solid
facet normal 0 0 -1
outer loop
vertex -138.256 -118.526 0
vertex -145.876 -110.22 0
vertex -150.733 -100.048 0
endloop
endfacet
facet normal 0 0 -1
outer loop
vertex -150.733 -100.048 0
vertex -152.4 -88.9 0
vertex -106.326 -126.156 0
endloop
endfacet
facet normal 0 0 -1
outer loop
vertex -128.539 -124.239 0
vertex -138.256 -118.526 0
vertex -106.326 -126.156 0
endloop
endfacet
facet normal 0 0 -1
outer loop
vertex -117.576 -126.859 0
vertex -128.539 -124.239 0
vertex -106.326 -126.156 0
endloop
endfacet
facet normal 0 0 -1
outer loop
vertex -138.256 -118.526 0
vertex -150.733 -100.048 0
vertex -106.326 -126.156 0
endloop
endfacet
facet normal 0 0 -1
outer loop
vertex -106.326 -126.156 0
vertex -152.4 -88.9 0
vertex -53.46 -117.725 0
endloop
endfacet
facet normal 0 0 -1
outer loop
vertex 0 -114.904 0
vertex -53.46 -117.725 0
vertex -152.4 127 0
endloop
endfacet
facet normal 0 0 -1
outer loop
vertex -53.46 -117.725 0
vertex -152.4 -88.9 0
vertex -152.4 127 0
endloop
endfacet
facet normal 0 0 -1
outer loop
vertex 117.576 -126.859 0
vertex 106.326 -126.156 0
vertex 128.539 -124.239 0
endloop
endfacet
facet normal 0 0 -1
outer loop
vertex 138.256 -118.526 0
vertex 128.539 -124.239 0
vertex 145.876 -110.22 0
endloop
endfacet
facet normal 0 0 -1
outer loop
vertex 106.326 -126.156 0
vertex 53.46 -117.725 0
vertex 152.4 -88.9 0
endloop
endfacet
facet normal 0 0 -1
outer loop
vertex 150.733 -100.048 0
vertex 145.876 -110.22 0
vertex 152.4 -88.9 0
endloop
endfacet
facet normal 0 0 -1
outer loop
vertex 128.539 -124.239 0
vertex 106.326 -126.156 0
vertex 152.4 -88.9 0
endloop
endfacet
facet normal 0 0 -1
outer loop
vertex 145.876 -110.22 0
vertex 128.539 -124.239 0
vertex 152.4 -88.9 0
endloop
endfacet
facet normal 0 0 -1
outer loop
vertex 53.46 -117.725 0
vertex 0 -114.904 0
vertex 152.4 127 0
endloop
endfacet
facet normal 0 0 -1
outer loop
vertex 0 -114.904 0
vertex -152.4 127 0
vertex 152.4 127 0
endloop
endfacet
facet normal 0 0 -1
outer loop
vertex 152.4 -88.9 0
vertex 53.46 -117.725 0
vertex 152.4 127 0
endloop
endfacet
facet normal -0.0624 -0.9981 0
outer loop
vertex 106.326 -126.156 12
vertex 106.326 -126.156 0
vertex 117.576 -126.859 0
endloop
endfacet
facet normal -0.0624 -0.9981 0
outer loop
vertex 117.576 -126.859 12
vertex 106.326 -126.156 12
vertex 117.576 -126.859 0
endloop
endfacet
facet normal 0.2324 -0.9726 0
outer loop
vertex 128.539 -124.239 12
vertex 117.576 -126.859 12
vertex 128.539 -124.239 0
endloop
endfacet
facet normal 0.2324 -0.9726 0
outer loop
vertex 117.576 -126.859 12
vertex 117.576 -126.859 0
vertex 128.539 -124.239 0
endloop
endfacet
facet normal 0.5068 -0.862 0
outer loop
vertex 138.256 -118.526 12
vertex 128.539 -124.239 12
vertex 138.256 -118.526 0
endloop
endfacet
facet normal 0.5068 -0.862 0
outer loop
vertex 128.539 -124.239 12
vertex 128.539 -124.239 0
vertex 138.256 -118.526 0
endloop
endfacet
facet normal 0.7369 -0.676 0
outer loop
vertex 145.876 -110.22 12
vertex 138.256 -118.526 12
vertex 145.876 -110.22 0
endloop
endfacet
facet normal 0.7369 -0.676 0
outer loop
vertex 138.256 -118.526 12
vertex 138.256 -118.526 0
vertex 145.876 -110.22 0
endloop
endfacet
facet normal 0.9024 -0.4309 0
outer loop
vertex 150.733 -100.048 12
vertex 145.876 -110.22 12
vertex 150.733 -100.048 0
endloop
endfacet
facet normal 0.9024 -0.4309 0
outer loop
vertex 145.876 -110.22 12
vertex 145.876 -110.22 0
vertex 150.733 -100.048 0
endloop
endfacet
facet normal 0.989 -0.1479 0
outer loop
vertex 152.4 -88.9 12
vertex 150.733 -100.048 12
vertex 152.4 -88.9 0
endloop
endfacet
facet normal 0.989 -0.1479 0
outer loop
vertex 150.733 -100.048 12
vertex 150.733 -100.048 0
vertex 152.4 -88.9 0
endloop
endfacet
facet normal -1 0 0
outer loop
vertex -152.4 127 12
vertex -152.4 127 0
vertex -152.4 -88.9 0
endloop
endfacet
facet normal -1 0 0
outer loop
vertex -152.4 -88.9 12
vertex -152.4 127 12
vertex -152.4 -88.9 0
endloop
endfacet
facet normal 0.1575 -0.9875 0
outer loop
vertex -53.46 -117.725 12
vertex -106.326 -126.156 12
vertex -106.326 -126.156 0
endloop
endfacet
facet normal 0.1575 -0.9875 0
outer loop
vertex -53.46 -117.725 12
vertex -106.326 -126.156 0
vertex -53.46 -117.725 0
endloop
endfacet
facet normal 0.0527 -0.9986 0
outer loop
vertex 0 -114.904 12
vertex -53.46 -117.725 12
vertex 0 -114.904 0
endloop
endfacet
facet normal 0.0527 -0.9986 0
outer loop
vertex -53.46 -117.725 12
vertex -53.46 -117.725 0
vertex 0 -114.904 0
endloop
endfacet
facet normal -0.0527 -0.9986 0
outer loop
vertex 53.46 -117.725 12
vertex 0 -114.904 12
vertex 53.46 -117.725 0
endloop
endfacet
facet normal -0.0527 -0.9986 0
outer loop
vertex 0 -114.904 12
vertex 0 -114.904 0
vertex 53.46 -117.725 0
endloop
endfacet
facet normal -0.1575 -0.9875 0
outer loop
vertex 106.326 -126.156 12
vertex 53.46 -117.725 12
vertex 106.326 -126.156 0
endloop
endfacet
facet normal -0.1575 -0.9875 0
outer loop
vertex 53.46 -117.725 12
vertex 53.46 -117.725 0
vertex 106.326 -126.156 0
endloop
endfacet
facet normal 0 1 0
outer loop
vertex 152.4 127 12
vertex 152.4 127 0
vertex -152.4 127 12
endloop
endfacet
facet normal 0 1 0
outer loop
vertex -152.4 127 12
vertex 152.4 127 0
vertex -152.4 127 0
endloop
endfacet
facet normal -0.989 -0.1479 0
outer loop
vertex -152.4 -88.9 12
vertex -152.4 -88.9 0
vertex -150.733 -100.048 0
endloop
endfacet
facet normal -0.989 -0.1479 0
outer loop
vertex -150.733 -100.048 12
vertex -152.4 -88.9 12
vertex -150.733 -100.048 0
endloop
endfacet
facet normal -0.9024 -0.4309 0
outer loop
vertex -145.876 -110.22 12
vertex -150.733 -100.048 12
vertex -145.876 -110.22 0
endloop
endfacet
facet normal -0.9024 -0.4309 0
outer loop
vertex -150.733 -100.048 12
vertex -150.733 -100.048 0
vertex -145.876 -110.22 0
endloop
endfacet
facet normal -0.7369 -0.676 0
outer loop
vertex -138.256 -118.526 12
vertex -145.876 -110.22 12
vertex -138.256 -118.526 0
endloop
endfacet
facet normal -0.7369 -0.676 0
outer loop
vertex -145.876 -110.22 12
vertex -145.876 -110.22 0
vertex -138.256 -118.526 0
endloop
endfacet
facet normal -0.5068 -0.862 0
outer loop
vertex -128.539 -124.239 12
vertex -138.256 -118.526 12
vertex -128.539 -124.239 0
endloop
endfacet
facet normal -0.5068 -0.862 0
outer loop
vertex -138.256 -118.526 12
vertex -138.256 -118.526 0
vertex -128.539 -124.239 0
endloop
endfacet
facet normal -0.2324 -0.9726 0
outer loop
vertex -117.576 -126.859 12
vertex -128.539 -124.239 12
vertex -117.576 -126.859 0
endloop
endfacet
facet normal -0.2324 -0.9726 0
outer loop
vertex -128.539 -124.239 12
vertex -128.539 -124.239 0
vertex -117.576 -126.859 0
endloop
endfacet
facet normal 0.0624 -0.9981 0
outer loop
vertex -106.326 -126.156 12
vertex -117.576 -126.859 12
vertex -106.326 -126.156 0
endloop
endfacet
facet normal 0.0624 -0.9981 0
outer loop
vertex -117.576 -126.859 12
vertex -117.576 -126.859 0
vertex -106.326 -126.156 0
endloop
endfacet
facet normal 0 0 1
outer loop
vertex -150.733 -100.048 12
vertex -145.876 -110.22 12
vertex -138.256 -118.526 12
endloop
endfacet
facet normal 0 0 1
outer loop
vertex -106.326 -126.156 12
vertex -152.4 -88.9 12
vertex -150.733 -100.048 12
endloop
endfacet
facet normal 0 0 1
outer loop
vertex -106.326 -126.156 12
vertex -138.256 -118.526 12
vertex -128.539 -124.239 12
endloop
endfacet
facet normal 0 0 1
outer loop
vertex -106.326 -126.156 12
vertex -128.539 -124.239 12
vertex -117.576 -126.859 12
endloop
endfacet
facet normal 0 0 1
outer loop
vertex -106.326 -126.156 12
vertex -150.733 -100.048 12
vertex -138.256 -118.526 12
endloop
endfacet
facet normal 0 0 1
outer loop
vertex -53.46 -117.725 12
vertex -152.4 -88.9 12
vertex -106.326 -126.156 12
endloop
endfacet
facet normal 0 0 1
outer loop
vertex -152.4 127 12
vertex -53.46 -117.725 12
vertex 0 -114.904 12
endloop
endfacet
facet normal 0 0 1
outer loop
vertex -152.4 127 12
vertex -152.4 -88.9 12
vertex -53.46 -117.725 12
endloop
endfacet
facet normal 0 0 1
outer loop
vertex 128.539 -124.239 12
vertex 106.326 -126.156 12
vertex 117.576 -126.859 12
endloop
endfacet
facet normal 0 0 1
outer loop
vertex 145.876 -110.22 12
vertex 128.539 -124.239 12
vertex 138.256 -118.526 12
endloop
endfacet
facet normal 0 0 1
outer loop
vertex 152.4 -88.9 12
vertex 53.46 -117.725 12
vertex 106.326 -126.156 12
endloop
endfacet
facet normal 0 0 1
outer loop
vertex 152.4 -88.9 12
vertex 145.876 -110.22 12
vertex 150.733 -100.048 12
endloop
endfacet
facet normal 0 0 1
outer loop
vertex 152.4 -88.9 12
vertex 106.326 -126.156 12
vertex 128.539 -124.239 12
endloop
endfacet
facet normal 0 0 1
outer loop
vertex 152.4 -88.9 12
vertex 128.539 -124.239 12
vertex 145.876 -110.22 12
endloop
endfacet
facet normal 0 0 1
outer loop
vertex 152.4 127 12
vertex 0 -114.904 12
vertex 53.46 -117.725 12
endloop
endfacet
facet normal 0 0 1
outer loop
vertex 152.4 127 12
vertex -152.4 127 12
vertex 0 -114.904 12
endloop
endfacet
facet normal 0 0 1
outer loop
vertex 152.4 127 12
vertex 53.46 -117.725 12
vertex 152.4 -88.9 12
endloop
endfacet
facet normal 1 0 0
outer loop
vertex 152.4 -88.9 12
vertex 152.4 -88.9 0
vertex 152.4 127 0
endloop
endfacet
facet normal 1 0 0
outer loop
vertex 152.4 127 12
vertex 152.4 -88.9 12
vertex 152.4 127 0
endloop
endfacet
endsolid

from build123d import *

# Parameters (mm, degrees)
F1_DEPTH = 12


with BuildPart() as f1:
    # F0 (on Top) → F1 (new body)
    with BuildSketch(Plane.XY):
        with BuildLine():
            Line((152.4, 127), (-152.4, 127))
            Line((-152.4, 127), (-152.4, -88.9))
            ThreePointArc((-152.4, -88.9), (-138.25605, -118.5263), (-106.325581, -126.156122))
            ThreePointArc((-106.325581, -126.156122), (0, -114.904419), (106.325581, -126.156122))
            ThreePointArc((106.325581, -126.156122), (138.25605, -118.5263), (152.4, -88.9))
            Line((152.4, -88.9), (152.4, 127))
        make_face()
    extrude(amount=F1_DEPTH)


solid = f1.part
